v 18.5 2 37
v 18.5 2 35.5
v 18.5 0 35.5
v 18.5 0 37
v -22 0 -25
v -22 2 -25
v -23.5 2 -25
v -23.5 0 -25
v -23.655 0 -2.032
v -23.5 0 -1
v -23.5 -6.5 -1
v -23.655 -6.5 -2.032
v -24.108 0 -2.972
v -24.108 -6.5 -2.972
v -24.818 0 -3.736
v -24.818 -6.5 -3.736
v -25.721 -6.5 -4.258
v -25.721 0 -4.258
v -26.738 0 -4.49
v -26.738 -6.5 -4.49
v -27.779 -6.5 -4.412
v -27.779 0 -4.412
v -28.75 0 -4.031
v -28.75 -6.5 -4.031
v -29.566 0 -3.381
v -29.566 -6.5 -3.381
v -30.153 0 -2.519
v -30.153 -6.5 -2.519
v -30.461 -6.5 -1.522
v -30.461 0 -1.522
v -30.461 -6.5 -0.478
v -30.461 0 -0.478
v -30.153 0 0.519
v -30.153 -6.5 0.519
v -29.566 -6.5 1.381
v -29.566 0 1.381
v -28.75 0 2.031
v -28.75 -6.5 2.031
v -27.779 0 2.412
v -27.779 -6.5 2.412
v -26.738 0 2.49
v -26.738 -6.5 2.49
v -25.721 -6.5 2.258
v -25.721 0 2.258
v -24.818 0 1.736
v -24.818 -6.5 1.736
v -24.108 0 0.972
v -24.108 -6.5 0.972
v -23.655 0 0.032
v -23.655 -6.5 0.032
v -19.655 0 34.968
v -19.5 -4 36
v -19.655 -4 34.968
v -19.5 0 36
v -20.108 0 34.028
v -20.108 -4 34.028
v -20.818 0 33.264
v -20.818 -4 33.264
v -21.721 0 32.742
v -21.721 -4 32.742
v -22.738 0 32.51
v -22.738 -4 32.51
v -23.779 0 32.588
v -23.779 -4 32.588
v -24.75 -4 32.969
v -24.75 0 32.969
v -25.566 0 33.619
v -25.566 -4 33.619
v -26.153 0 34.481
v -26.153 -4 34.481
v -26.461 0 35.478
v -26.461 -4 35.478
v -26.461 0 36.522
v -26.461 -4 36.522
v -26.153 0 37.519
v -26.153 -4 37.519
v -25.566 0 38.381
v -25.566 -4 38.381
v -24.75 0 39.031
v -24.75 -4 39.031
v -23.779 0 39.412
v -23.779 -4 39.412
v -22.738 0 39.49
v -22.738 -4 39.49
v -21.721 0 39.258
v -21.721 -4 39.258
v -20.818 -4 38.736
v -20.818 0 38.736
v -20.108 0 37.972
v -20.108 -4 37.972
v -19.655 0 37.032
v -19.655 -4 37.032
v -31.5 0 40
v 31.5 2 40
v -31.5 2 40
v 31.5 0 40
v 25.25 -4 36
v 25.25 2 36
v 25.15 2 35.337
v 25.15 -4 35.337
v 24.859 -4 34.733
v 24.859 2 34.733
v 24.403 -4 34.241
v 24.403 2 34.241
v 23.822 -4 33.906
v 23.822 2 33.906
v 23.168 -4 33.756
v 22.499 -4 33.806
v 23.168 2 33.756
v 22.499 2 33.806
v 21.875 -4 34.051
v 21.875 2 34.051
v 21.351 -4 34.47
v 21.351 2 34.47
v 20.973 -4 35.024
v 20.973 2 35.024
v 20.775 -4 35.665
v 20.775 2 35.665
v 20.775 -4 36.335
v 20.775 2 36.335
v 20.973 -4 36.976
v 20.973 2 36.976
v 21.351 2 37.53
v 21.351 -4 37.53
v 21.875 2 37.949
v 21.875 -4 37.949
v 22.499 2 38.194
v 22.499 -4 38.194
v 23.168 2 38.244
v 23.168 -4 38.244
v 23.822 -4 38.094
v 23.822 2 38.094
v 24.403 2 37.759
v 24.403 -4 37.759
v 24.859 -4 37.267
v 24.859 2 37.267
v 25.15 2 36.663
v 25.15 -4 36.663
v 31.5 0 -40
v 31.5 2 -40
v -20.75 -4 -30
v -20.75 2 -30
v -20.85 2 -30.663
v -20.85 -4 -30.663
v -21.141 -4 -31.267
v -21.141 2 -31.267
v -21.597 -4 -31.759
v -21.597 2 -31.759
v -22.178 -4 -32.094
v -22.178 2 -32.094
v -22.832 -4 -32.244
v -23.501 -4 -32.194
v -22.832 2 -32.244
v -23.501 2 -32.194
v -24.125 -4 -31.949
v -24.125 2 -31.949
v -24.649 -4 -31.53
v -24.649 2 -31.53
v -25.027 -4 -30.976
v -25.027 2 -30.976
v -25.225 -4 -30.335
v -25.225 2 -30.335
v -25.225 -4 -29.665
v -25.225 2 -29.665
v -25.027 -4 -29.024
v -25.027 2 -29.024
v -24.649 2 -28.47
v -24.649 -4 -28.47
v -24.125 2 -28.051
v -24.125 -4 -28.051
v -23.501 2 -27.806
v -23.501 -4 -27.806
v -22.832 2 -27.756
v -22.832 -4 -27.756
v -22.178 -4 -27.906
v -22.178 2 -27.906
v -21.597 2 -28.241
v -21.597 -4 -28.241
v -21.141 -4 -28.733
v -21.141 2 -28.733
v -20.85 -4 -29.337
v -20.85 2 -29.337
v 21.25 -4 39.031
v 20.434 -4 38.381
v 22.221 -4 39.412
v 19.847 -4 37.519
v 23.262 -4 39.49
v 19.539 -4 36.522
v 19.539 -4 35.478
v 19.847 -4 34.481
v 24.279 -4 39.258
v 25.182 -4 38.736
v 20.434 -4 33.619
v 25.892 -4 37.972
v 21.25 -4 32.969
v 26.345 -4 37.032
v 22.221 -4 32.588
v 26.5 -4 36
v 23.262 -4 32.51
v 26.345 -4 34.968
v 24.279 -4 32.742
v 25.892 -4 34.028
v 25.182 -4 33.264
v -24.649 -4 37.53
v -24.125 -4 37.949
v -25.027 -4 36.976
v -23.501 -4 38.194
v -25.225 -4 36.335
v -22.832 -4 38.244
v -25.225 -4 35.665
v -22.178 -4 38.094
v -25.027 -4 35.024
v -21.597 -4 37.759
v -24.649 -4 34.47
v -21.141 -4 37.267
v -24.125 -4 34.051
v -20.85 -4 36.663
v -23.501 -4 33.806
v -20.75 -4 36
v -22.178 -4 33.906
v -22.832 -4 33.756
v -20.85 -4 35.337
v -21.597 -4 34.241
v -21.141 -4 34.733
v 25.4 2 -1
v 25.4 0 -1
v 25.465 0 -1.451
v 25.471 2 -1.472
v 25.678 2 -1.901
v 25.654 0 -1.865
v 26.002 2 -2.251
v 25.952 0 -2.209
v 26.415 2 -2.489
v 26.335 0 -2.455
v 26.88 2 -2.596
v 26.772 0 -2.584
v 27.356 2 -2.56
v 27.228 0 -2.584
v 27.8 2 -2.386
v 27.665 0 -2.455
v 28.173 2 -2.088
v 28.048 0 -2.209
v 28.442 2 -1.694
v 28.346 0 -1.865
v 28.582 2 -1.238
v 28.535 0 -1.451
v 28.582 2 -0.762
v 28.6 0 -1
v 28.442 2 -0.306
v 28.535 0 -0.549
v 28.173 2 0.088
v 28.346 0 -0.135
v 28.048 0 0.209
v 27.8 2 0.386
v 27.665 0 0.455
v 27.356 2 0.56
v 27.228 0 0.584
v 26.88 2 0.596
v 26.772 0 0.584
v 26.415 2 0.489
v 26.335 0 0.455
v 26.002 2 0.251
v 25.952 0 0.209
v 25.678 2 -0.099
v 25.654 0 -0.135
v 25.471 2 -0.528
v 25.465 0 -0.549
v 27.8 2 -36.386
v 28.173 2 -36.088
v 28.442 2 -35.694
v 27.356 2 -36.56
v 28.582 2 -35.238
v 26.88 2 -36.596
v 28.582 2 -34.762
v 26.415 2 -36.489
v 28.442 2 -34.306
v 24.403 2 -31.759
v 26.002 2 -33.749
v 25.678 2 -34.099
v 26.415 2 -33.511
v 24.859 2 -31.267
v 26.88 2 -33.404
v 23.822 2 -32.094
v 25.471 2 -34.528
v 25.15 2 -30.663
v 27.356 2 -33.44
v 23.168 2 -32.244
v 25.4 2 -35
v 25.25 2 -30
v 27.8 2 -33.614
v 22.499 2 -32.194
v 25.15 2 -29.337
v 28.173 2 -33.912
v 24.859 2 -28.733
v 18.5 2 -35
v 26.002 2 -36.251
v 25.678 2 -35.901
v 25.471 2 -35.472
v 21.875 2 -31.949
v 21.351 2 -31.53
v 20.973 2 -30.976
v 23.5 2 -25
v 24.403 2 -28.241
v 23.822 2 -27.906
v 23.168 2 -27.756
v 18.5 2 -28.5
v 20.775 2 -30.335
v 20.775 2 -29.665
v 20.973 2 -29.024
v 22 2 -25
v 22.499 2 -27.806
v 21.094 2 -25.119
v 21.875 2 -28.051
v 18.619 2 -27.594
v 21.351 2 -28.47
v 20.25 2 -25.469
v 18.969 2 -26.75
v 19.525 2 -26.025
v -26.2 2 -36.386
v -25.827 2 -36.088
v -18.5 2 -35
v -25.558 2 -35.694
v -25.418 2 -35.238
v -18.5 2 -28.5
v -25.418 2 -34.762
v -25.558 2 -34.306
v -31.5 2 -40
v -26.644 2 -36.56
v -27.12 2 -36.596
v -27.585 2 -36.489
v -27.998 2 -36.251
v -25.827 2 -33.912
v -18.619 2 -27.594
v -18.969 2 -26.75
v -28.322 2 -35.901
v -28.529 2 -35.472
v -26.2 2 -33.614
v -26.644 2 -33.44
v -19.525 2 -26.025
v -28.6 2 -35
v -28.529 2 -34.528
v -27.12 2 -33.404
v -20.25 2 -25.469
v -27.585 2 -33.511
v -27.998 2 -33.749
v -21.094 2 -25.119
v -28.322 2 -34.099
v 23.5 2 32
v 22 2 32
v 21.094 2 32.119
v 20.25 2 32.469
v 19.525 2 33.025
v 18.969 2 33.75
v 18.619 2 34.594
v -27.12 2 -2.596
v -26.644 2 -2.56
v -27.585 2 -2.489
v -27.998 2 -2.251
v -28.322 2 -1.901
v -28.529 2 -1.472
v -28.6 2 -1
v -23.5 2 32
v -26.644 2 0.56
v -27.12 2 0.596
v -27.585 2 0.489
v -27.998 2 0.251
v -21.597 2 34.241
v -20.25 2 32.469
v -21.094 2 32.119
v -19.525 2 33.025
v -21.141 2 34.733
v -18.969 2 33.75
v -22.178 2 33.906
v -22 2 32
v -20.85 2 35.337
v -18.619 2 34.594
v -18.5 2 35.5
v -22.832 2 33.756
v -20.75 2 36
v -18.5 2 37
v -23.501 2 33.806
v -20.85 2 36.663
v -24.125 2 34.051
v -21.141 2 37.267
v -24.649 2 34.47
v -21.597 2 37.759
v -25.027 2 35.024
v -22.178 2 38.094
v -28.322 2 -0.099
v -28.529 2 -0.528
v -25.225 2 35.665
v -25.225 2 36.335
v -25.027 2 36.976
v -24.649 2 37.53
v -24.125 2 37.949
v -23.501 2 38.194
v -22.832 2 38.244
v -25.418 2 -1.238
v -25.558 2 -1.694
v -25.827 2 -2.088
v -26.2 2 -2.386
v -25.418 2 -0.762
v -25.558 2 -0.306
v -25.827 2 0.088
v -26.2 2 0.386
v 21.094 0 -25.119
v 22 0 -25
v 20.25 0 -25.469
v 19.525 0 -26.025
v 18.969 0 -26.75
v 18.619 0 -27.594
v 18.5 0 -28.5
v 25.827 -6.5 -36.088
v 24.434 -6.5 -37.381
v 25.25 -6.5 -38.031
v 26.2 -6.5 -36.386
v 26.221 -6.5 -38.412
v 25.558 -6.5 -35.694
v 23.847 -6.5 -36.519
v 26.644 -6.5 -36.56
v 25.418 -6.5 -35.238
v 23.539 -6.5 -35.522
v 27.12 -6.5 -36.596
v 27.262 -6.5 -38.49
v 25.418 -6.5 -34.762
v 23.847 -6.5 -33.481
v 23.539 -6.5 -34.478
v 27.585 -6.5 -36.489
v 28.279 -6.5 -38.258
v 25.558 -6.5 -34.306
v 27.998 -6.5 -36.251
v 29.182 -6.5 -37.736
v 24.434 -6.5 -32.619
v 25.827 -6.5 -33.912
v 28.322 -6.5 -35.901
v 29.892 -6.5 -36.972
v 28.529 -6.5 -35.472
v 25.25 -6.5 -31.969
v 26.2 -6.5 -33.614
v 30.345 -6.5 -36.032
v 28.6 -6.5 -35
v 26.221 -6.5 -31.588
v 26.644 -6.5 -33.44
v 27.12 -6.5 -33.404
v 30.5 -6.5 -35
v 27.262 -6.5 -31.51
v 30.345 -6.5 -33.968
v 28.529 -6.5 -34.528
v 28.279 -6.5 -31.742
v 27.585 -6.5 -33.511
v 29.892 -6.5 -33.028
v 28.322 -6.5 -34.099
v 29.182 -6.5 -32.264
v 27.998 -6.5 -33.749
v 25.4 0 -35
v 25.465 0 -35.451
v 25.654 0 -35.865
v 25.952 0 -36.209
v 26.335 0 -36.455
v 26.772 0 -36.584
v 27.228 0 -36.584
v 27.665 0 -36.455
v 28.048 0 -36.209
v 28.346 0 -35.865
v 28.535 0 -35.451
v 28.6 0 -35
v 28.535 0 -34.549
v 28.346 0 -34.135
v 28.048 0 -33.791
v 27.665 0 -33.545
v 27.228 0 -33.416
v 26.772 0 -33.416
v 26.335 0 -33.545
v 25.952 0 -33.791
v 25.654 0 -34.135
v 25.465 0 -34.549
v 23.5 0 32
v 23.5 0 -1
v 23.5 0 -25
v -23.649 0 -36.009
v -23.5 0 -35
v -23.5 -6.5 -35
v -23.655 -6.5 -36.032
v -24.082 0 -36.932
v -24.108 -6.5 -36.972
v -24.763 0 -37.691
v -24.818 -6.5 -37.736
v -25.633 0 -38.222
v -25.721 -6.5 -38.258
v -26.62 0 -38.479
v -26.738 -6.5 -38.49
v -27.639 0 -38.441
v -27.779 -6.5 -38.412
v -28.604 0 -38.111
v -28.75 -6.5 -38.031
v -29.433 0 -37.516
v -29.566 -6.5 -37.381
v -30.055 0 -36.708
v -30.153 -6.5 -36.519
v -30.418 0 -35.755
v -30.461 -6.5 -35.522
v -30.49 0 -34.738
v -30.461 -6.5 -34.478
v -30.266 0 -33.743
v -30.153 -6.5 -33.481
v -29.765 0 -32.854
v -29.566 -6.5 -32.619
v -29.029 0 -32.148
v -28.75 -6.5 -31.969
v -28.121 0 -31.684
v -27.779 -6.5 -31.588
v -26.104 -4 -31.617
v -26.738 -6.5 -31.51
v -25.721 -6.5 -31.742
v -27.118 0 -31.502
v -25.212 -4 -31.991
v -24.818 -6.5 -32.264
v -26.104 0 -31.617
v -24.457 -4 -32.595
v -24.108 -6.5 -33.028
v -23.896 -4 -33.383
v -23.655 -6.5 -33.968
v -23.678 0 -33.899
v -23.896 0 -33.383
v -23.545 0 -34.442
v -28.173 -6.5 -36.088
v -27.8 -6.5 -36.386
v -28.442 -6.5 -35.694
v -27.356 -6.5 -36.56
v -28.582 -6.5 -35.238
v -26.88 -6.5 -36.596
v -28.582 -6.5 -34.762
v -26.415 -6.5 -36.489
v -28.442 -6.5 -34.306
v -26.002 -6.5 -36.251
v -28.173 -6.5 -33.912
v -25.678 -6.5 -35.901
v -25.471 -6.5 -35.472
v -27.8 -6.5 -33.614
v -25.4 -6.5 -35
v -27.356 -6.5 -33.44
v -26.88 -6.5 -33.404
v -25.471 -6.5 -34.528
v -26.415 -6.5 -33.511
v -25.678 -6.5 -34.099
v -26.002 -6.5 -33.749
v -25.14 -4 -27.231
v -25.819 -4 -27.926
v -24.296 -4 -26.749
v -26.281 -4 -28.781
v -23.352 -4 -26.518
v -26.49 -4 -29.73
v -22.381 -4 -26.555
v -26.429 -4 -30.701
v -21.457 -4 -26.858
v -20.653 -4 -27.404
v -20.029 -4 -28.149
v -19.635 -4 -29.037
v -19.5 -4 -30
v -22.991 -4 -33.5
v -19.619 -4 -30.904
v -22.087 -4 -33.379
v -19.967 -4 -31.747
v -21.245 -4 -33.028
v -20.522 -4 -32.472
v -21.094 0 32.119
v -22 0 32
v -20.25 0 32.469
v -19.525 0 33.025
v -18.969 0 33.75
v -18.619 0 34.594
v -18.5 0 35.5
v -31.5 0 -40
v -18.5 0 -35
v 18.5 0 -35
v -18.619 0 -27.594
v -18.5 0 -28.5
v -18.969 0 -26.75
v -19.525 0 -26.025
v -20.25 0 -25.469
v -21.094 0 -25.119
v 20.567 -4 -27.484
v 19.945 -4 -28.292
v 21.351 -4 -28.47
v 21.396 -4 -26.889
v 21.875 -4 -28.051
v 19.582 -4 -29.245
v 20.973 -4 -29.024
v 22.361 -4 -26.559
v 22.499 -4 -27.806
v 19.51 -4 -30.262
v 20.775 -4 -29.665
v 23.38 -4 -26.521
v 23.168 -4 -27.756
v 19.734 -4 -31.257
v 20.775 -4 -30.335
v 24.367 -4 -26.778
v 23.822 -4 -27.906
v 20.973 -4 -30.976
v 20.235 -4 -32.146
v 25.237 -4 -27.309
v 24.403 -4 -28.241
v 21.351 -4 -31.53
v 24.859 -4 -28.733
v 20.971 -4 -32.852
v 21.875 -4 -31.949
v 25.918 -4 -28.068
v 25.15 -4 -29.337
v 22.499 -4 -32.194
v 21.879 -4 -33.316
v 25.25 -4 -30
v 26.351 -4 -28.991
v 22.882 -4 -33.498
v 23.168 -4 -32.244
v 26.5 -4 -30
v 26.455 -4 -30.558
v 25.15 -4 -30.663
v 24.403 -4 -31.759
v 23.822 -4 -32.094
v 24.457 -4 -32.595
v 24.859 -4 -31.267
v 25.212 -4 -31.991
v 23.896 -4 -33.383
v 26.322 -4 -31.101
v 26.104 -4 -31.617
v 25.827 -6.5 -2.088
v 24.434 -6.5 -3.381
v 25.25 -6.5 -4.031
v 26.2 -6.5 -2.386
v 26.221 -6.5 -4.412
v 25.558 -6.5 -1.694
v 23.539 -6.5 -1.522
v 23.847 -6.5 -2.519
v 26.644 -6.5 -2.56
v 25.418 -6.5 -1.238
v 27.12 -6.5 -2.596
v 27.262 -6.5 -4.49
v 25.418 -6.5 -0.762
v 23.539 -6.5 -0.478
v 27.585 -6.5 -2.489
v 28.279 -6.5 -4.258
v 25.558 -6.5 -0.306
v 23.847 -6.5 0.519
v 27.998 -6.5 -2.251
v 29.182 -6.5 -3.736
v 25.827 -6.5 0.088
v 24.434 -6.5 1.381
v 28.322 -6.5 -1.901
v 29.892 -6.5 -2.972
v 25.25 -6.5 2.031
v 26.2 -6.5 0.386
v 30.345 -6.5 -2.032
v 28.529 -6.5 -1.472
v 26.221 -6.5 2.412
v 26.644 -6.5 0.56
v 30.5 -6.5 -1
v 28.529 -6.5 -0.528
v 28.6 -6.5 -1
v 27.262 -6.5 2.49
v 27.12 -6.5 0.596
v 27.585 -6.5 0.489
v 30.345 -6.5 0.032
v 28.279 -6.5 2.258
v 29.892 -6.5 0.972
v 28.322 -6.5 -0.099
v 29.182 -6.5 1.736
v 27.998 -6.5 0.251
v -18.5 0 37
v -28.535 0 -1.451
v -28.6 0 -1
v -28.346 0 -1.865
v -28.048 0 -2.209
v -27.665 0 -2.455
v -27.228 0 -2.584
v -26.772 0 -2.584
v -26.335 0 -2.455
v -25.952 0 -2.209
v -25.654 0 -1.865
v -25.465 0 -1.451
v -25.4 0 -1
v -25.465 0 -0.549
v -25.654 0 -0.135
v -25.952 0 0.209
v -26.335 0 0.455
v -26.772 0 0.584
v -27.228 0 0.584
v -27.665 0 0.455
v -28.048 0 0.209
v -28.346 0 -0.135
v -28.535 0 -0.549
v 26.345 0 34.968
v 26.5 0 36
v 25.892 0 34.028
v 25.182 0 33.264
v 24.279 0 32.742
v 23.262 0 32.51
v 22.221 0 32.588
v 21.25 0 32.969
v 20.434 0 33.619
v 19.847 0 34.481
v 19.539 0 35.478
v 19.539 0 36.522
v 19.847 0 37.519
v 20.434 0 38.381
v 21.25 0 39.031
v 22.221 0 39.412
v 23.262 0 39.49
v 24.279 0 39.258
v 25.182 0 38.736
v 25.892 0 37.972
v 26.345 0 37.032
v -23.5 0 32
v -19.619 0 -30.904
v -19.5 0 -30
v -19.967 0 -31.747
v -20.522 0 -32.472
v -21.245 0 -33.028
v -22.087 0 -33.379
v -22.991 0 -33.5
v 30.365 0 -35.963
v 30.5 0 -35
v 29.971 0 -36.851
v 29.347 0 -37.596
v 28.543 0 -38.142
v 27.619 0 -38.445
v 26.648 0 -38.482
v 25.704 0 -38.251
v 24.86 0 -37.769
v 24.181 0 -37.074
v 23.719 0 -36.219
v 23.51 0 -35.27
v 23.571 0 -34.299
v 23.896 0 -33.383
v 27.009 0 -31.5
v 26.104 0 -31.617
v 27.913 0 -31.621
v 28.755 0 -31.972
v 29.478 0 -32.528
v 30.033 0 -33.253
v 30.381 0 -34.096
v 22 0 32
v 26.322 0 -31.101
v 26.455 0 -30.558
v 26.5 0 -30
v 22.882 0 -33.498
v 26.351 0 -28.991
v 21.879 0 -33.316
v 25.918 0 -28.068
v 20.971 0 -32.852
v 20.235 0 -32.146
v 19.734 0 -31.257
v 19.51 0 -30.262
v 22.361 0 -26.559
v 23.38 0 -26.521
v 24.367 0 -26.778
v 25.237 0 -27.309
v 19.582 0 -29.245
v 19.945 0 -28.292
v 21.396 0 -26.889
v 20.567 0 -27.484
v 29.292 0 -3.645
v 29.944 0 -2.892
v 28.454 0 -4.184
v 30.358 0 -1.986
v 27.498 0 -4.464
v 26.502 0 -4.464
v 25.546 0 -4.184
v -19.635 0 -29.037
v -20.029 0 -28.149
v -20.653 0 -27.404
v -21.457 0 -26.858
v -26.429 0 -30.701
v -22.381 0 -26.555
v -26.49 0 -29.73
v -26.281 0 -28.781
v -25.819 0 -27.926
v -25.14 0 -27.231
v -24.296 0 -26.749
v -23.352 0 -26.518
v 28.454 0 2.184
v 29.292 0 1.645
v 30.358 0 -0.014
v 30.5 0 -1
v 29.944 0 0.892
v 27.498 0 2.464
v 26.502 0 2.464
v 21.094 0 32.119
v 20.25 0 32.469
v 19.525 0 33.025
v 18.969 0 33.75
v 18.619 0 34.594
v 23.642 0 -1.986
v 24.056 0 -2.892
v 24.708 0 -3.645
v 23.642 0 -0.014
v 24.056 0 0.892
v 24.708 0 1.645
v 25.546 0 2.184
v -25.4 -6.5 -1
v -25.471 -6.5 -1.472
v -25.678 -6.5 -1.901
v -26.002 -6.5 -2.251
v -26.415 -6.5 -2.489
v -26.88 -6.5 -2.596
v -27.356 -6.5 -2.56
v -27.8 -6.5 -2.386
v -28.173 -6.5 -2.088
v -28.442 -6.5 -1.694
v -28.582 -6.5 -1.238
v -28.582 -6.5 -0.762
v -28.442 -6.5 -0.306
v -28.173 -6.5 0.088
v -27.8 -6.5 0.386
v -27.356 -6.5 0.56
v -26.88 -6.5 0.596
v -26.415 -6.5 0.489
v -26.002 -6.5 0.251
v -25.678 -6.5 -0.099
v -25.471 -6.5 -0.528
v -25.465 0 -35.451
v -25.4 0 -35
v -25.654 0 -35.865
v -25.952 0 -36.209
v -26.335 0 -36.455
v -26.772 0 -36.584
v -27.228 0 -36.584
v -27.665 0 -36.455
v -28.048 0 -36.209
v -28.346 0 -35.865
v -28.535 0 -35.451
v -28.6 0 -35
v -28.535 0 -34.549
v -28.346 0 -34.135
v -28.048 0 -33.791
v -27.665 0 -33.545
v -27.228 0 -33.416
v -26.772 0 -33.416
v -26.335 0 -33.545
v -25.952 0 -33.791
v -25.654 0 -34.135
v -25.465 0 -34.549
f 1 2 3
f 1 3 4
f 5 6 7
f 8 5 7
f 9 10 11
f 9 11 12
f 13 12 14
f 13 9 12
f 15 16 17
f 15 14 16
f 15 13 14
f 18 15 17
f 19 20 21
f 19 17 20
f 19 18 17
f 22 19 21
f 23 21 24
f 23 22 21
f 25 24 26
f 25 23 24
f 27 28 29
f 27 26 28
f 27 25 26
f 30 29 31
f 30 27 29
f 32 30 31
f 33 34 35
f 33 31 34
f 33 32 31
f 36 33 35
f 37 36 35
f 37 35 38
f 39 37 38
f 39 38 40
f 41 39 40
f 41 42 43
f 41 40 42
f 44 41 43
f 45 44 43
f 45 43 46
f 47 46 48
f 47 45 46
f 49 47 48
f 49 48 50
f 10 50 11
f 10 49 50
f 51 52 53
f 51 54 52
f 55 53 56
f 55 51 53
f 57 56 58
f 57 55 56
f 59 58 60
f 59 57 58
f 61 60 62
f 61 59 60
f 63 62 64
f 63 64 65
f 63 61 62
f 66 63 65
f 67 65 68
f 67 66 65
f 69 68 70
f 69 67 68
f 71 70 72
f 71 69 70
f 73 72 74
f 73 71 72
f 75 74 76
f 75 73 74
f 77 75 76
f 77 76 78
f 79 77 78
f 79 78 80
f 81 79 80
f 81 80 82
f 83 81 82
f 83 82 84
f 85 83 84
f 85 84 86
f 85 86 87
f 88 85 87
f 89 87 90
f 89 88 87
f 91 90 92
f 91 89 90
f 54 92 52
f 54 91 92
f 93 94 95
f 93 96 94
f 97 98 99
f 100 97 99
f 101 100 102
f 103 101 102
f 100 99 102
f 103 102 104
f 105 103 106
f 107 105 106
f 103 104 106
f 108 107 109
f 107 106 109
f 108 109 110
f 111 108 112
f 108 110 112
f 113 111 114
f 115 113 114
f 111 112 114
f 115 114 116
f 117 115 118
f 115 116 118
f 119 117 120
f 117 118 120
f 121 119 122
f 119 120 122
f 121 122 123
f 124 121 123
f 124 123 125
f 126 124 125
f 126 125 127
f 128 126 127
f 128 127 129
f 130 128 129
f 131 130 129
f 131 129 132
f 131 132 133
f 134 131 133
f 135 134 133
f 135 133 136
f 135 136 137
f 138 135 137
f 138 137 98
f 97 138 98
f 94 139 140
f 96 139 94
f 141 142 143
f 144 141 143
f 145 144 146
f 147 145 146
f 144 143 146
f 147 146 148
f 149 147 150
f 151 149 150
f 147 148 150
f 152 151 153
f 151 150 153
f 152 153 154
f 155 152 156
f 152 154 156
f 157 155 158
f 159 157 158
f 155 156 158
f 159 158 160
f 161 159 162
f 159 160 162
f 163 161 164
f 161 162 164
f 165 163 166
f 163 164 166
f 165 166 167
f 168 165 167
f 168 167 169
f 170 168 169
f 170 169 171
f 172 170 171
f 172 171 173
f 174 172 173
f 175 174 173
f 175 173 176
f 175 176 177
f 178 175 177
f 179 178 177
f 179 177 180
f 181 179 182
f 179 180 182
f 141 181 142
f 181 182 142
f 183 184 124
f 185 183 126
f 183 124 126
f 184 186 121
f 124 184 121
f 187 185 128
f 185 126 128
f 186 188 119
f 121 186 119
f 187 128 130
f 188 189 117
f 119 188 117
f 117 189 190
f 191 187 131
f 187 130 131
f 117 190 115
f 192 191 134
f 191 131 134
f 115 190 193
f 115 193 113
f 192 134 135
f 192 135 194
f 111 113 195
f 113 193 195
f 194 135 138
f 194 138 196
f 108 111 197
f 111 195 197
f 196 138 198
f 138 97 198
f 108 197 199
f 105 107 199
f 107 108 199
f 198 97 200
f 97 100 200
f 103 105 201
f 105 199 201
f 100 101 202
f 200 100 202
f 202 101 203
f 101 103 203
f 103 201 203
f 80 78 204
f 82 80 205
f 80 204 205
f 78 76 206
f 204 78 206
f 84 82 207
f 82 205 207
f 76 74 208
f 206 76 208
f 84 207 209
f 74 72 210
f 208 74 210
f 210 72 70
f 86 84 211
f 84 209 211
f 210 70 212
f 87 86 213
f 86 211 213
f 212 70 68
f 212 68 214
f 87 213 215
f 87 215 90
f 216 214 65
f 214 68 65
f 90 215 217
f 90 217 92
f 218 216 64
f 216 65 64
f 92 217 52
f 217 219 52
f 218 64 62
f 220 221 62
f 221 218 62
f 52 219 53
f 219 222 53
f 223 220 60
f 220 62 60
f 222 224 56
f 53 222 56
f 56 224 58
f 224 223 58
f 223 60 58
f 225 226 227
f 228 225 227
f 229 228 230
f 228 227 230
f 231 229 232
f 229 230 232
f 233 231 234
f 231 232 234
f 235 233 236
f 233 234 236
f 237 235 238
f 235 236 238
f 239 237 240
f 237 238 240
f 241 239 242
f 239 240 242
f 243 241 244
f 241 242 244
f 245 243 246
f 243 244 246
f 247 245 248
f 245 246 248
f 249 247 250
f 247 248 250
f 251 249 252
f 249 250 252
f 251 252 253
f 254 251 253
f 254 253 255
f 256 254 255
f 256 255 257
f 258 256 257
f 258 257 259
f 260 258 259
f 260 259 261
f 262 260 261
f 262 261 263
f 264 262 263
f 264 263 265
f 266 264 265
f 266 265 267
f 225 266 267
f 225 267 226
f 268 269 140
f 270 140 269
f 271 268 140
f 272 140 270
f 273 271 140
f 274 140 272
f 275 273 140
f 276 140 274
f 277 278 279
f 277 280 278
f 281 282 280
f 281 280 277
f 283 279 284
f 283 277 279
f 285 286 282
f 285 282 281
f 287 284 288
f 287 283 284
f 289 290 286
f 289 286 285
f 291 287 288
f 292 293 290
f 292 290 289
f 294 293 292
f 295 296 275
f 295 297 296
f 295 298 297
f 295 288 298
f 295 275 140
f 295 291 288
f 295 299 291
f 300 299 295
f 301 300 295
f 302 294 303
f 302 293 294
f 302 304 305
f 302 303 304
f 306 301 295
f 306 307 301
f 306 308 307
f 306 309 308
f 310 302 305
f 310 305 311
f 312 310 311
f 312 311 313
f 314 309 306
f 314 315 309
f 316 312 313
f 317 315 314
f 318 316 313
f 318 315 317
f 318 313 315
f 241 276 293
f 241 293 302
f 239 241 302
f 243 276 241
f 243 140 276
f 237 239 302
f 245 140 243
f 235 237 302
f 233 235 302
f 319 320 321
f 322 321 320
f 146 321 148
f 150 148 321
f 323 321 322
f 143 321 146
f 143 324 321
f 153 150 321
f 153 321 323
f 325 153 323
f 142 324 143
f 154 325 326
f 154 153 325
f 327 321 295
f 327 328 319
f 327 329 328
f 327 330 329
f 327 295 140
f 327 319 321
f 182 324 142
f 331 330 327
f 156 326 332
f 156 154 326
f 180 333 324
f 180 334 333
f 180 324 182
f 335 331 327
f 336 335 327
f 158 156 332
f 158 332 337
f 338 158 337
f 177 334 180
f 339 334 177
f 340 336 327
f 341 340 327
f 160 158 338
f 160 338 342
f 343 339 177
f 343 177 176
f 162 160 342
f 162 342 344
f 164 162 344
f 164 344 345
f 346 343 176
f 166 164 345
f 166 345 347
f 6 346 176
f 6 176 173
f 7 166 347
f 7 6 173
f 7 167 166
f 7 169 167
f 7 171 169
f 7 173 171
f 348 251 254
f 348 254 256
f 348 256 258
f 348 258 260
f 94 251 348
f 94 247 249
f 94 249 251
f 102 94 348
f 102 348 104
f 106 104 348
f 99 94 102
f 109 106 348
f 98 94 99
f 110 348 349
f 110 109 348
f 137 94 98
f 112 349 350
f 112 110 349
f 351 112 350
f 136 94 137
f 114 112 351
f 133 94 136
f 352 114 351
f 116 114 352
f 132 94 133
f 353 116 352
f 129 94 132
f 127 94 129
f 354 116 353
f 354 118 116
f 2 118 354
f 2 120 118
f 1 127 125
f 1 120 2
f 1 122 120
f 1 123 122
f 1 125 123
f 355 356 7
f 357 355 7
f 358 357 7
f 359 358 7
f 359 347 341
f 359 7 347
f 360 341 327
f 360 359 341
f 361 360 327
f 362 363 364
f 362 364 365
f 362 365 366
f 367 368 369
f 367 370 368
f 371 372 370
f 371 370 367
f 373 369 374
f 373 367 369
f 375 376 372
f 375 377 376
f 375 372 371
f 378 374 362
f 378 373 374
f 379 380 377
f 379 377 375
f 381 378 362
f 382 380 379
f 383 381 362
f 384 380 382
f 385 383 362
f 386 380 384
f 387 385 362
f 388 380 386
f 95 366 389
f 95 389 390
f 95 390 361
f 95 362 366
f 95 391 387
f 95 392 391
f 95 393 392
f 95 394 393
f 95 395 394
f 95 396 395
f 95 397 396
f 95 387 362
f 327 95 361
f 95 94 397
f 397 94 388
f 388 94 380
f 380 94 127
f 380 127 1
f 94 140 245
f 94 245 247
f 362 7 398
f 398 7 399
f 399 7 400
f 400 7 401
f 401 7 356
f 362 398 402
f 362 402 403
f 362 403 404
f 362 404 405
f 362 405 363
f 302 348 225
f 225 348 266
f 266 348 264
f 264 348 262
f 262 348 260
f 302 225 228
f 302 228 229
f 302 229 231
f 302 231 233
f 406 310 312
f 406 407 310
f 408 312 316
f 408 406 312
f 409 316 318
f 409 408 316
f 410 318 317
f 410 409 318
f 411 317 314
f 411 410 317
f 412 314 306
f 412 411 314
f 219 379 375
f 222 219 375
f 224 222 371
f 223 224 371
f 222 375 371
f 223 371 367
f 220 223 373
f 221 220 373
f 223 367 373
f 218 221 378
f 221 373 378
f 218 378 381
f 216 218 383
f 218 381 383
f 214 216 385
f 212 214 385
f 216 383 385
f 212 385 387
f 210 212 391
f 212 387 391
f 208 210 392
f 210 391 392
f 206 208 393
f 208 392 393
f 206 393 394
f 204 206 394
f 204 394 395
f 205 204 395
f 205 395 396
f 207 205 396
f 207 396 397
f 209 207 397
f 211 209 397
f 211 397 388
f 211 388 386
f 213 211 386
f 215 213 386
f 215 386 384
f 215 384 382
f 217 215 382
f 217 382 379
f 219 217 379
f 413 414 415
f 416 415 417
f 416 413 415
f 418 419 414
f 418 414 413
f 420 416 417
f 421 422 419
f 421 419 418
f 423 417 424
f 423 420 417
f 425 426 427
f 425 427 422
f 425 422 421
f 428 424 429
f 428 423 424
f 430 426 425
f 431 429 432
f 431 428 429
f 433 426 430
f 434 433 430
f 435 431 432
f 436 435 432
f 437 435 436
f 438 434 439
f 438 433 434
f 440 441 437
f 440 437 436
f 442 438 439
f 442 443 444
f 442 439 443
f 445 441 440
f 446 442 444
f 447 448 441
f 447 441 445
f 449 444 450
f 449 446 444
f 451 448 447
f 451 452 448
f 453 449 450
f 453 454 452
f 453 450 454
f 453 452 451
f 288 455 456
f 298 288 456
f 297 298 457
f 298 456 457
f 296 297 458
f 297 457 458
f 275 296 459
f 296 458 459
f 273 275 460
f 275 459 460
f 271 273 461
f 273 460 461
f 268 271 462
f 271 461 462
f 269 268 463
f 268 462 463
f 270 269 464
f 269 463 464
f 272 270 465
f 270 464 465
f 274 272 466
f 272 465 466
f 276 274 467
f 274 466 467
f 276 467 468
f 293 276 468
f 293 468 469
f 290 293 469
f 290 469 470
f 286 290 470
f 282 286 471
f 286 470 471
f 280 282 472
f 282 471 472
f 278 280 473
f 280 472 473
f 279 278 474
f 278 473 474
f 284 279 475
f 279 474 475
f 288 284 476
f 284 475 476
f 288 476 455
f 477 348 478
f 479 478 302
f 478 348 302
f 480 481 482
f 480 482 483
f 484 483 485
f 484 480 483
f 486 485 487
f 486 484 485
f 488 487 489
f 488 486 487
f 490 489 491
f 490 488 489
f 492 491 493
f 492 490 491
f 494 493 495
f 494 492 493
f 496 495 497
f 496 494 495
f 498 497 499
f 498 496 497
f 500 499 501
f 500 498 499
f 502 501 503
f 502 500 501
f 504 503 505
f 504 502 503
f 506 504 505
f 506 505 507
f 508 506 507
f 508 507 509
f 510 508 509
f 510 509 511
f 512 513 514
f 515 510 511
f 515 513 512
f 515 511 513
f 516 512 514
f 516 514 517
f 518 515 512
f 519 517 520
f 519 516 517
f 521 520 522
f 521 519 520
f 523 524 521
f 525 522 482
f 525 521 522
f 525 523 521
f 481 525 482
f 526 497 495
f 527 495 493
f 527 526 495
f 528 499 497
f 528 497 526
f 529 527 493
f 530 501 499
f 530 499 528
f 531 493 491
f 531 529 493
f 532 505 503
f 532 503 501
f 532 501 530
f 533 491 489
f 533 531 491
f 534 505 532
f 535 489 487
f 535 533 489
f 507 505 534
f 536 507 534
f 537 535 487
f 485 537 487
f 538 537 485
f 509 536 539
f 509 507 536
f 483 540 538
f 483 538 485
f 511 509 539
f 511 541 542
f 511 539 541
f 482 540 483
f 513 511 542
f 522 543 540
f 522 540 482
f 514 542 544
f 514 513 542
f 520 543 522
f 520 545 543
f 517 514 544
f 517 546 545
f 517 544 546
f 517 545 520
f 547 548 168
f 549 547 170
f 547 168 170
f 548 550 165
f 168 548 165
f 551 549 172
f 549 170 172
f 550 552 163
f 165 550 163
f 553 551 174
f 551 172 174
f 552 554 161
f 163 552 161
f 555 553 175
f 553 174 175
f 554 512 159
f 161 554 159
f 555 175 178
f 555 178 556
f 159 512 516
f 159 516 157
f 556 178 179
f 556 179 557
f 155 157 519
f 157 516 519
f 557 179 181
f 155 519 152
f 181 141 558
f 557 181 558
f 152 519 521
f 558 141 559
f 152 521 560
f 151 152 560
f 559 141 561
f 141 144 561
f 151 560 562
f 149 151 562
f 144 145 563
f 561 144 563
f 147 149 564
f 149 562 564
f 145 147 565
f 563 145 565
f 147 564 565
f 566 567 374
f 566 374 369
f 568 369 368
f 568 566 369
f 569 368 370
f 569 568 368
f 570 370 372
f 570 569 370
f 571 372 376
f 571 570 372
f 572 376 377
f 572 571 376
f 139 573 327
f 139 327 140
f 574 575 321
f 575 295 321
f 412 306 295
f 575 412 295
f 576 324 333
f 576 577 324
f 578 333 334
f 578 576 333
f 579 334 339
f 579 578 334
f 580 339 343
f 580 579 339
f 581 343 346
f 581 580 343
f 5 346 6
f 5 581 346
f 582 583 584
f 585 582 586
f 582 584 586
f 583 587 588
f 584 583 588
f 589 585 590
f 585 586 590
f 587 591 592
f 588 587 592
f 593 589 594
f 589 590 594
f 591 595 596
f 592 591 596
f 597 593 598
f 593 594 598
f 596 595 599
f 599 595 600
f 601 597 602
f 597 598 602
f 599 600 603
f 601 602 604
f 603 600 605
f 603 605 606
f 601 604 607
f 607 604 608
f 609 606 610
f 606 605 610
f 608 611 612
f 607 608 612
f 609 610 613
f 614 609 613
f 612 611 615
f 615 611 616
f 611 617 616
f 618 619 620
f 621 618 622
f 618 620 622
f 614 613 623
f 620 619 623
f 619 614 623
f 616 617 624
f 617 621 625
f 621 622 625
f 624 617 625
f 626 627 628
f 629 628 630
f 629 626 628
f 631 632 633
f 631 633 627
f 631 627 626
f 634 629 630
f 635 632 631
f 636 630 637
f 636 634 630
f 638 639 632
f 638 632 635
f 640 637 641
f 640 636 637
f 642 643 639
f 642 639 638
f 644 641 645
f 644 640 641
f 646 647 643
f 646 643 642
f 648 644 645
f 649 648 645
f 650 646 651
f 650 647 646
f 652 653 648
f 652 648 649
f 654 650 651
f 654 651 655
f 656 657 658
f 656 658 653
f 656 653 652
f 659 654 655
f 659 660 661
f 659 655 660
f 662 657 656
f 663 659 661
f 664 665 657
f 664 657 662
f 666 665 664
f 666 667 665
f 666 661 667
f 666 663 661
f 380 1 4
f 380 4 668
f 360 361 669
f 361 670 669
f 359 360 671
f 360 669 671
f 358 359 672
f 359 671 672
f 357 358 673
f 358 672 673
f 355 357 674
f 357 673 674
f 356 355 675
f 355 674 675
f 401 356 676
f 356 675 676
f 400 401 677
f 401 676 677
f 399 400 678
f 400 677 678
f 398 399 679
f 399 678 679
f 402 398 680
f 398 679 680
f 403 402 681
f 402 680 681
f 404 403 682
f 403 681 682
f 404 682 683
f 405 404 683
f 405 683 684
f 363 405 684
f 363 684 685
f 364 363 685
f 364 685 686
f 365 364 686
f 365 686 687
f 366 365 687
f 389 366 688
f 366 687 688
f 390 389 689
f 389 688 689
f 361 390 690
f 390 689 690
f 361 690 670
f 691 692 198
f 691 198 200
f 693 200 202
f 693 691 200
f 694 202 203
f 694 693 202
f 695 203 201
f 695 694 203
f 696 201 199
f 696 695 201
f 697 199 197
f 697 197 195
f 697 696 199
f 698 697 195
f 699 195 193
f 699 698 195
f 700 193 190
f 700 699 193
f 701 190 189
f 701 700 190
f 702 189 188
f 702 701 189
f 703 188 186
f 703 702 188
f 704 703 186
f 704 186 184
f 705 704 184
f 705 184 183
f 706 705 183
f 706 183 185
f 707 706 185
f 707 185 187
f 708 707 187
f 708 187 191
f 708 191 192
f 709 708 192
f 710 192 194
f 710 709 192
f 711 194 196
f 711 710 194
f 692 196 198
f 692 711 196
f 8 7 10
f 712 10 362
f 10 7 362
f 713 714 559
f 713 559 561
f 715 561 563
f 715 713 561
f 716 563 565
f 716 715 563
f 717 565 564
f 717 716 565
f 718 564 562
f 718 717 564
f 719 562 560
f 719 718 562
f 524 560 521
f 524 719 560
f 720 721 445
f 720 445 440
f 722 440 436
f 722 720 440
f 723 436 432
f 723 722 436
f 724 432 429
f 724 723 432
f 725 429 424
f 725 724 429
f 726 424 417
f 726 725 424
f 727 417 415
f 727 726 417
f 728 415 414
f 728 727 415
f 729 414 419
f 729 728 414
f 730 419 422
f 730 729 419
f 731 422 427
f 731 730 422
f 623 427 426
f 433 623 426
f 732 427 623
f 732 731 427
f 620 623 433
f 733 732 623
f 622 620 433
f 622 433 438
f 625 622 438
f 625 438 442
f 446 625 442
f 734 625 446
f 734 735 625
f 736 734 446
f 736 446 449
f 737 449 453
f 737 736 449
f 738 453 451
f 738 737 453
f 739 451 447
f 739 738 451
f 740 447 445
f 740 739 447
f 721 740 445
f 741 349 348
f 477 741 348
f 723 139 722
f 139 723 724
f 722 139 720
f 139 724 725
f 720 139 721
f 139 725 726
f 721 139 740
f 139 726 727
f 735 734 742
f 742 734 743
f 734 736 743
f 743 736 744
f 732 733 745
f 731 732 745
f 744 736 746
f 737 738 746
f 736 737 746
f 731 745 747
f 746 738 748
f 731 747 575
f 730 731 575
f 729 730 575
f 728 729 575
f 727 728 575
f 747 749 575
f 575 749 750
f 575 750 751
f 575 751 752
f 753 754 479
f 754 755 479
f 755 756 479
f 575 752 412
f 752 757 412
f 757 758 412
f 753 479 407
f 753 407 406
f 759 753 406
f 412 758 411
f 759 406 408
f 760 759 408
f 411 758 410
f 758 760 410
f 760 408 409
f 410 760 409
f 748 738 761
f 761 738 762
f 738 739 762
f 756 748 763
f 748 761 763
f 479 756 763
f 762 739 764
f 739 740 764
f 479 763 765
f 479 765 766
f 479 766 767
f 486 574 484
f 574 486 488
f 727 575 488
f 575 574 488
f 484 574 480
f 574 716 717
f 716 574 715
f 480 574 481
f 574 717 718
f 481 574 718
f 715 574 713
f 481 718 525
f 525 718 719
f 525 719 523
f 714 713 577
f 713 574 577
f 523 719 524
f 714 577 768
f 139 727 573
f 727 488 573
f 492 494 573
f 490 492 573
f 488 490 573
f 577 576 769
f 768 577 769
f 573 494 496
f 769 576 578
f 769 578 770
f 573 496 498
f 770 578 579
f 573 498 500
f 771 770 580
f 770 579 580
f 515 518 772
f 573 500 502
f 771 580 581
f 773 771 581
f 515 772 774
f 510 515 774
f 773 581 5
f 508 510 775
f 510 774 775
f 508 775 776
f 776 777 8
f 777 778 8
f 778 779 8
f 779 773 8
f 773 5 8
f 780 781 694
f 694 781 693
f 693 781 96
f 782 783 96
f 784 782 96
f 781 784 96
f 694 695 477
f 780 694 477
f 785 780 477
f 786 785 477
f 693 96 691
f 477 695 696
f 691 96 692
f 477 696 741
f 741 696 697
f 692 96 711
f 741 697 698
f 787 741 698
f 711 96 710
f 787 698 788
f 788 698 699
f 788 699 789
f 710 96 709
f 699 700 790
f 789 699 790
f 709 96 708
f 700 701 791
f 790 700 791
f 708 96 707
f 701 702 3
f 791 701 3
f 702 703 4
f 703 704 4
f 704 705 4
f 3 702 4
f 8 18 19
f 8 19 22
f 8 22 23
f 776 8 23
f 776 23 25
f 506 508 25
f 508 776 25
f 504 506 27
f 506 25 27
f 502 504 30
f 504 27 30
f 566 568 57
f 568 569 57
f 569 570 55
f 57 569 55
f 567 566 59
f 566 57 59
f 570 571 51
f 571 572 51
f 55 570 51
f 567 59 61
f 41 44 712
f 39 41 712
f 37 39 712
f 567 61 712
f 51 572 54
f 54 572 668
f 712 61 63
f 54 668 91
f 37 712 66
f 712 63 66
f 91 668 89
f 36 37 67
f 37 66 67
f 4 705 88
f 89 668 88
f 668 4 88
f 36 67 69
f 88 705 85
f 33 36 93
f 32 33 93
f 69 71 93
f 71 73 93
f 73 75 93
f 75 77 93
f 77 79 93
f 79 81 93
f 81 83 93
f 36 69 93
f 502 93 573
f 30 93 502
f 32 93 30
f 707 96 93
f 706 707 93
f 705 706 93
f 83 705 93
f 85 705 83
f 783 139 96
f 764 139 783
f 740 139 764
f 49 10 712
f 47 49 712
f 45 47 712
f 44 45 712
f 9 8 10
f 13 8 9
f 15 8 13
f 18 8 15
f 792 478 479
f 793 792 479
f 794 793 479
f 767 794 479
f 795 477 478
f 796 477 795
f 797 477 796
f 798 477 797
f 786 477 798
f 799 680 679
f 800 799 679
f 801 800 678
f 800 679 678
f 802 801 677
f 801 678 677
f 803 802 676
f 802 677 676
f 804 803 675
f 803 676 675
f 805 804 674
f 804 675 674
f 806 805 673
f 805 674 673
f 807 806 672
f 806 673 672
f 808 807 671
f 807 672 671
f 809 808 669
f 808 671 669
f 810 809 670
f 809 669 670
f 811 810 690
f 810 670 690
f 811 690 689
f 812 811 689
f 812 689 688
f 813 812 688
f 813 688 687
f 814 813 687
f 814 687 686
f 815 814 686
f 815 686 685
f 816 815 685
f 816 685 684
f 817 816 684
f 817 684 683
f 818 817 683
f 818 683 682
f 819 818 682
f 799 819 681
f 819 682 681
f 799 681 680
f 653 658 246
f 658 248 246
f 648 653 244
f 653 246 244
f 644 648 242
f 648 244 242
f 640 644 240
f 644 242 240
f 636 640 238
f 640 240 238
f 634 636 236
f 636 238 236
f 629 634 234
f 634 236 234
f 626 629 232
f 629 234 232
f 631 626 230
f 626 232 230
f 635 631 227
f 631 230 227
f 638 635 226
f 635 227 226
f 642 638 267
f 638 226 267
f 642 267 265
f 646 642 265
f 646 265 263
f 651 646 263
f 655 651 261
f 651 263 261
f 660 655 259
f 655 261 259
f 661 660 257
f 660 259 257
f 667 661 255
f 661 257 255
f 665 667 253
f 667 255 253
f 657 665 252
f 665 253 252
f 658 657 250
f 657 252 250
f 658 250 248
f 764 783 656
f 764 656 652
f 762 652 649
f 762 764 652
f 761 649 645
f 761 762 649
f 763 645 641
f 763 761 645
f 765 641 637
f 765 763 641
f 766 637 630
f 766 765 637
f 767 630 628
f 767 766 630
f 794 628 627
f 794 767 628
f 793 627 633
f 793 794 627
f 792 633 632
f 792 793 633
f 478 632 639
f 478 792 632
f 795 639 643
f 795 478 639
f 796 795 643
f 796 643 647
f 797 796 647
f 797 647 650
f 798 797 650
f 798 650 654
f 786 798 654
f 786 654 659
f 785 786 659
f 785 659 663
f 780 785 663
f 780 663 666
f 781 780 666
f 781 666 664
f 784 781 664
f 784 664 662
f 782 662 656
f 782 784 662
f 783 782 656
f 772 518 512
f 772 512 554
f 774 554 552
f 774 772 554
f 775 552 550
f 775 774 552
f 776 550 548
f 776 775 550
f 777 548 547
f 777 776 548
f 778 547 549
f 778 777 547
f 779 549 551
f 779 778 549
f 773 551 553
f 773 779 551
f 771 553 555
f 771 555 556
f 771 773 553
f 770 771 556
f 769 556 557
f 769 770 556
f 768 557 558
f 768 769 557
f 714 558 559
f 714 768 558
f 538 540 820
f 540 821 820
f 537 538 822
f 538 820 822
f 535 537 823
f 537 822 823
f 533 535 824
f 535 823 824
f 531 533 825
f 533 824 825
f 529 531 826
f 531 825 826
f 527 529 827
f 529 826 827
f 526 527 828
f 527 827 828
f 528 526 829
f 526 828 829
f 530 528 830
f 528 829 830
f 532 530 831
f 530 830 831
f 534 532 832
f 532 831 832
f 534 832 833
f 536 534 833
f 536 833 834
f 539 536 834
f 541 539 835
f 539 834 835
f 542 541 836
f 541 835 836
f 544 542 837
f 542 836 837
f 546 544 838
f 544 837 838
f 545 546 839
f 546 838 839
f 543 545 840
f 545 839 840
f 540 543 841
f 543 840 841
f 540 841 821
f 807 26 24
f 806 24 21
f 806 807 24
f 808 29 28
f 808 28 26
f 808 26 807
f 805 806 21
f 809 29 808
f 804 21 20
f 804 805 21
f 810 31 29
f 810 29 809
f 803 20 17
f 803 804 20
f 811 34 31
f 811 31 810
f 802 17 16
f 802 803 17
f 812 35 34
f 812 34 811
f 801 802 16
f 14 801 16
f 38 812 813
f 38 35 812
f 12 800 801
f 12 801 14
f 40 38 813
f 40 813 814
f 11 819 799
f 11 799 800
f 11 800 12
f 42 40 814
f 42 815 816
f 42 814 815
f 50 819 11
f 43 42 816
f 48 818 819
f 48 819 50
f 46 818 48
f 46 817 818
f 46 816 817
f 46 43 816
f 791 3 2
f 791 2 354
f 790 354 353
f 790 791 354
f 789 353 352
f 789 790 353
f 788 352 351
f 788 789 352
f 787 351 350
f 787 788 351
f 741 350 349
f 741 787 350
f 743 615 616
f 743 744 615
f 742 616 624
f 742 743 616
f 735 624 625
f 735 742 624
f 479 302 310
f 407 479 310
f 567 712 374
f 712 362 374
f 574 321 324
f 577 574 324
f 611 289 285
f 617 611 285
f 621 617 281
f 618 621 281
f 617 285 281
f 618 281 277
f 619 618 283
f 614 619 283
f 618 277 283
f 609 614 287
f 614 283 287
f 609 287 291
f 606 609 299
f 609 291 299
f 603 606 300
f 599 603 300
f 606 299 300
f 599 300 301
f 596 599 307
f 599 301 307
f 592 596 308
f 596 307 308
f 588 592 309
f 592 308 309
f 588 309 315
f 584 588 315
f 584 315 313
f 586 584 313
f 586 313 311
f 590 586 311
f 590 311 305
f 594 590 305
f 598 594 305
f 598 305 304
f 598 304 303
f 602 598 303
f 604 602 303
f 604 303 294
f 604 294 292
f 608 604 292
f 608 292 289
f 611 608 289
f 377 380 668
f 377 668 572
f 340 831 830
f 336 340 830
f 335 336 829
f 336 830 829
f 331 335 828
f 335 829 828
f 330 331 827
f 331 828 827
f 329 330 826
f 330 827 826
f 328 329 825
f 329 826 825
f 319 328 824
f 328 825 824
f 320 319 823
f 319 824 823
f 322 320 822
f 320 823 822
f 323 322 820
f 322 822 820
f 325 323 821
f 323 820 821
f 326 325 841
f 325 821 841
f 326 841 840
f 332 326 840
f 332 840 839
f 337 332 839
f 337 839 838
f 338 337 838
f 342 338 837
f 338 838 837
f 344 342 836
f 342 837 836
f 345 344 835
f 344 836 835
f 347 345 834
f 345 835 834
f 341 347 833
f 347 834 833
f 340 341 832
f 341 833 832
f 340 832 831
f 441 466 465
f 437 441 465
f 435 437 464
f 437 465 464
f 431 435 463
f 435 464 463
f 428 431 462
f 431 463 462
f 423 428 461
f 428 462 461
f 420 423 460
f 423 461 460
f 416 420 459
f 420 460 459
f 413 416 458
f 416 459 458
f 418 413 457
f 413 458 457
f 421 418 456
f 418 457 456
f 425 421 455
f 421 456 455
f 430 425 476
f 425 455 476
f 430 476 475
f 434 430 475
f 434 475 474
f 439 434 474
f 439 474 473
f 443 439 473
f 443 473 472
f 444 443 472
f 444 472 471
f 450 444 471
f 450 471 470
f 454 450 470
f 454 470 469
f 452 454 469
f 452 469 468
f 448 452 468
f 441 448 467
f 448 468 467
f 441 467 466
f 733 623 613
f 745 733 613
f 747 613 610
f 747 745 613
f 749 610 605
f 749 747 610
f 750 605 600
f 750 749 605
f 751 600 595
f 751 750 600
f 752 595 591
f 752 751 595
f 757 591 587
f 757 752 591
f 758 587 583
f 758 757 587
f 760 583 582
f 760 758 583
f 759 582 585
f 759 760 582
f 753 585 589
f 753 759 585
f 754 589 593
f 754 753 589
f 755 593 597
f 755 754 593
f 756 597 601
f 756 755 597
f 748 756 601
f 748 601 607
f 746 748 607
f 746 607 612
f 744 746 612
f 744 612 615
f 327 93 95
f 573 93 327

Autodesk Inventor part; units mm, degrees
ref_plane "YZ Plane" through (0, 0, 0) normal (1, 0, 0) x (0, 1, 0)
ref_plane "XZ Plane" through (0, 0, 0) normal (0, 1, 0) x (-1, 0, 0)
ref_plane "XY Plane" through (0, 0, 0) normal (0, 0, 1) x (1, 0, 0)
sketch "Skizze1" plane through (0, 0, 0) normal (0, 1, 0) x (-1, 0, 0)
  line L0 (-31.5, 40) -> (31.5, 40)
  line L1 (31.5, 40) -> (31.5, -40)
  line L2 (31.5, -40) -> (-31.5, -40)
  line L3 (-31.5, -40) -> (-31.5, 40)
  line L4 (0, -56) -> (0, 56) projected
  line L5 (-44.1, 0) -> (44.1, 0) projected
  circle A0 centre (27, -35) radius 1.6
  circle A1 centre (-27, -35) radius 1.6
  circle A2 centre (-27, -1) radius 1.6
  circle A3 centre (27, -1) radius 1.6
  point P0 (0, 0)
  dimension "d0" = 63
  dimension "d1" = 80
  dimension "d2" = 3.2
  dimension "d3" = 3.2
  dimension "d4" = 27
  dimension "d5" = 27
  dimension "d6" = 5
  dimension "d7" = 5
  dimension "d8" = 3.2
  dimension "d9" = 3.2
  dimension "d10" = 27
  dimension "d11" = 27
  dimension "d12" = 34
  dimension "d13" = 34
extrude "Extrusion1" add sketch "Skizze1" along normal blind 2 contours L0 L4 L5 A2 L3 | L0 L1 L5 A3 L4 | L5 A2 L4 L2 L3 | L5 A3 L1 L2 L4
sketch "Skizze3" plane through (0, 2, 0) normal (0, 1, 0) x (1, 0, 0)
  circle A0 centre (-23, 30) radius 3.5
  circle A1 centre (23, 30) radius 3.5
  circle A2 centre (23, -36) radius 3.5
  circle A3 centre (-23, -36) radius 3.5
  line L0 (0, 56) -> (0, -56) projected
  line L1 (44.1, 0) -> (-44.1, 0) projected
  line L2 (31.5, 40) -> (-31.5, 40) projected
  point P0 (0, 0)
  dimension "d22" = 7
  dimension "d23" = 7
  dimension "d24" = 7
  dimension "d25" = 7
  dimension "d26" = 23
  dimension "d27" = 23
  dimension "d28" = 23
  dimension "d29" = 23
  dimension "d31" = 10
  dimension "d32" = 10
  dimension "d33" = 66
  dimension "d34" = 66
sketch "Skizze2" plane through (0, 0, 0) normal (0, -1, 0) x (1, 0, 0)
  circle A0 centre (27, -1) radius 1.6 projected
  circle A1 centre (27, -35) radius 1.6 projected
  circle A2 centre (-27, -35) radius 1.6 projected
  circle A3 centre (-27, -1) radius 1.6 projected
  circle A4 centre (27, -1) radius 3.5
  circle A5 centre (27, -35) radius 3.5
  circle A6 centre (-27, -1) radius 3.5
  circle A7 centre (-27, -35) radius 3.5
  point P0 (0, 0)
  dimension "d16" = 7
  dimension "d17" = 7
  dimension "d18" = 7
  dimension "d19" = 7
extrude "Extrusion2" add sketch "Skizze2" along normal blind 6.5
extrude "Extrusion3" add sketch "Skizze3" against normal blind 6
sketch "Skizze4" plane through (0, 2, 0) normal (0, 1, 0) x (1, 0, 0)
  arc A0 (23.8957, 33.3835) -> (26.1043, 31.6165) centre (23, 30) ccw projected
  circle A1 centre (23, -36) radius 3.5 projected
  circle A2 centre (-23, -36) radius 3.5 projected
  arc A3 (-26.1043, 31.6165) -> (-23.8957, 33.3835) centre (-23, 30) ccw projected
  circle A4 centre (23, 30) radius 2.25
  circle A5 centre (23, -36) radius 2.25
  circle A6 centre (-23, 30) radius 2.25
  circle A7 centre (-23, -36) radius 2.25
  point P0 (0, 0)
  dimension "d37" = 4.5
  dimension "d38" = 4.5
  dimension "d39" = 4.5
  dimension "d40" = 4.5
extrude "Extrusion4" cut sketch "Skizze4" against normal up to surface (6 mm away) contours A4 | A5 | A6 | A7
sketch "Skizze5" plane through (0, 2, 0) normal (0, 1, 0) x (1, 0, 0)
  line L0 (23.5, -32) -> (23.5, 25)
  line L1 (-23.5, 25) -> (-23.5, -32)
  line L2 (31.5, 40) -> (-31.5, 40) projected
  line L3 (-31.5, -40) -> (31.5, -40) projected
  line L4 (-31.5, 40) -> (-31.5, -40) projected
  line L5 (31.5, -40) -> (31.5, 40) projected
  line L6 (18.5, -32) -> (18.5, -37)
  line L7 (18.5, -37) -> (-18.5, -37)
  line L8 (-18.5, -37) -> (-18.5, -32)
  line L9 (18.5, 25) -> (18.5, 35)
  line L10 (18.5, 35) -> (-18.5, 35)
  line L11 (-18.5, 35) -> (-18.5, 25)
  line L12 (-23.5, -32) -> (-18.5, -32)
  line L13 (18.5, -32) -> (23.5, -32)
  line L14 (23.5, 25) -> (18.5, 25)
  line L15 (-18.5, 25) -> (-23.5, 25)
  point P0 (0, 0)
  dimension "d45" = 8
  dimension "d46" = 8
  dimension "d49" = 3
  dimension "d50" = 13
  dimension "d51" = 13
  dimension "d52" = 13
  dimension "d53" = 13
  dimension "d54" = 5
  dimension "d55" = 8
  dimension "d56" = 8
  dimension "d57" = 15
  dimension "d58" = 15
extrude "Extrusion5" cut sketch "Skizze5" against normal up to surface (2 mm away) contours L13 L6 L7 L8 L12 L1 L15 L11 L10 L9 L14 L0
fillet "Rundung1" radius 3.5 4 edges at (18.5, 1, 32) (18.5, 1, -25) (-18.5, 1, -25) (-18.5, 1, 32)
properties part number "Adapter_PowerManagement"
